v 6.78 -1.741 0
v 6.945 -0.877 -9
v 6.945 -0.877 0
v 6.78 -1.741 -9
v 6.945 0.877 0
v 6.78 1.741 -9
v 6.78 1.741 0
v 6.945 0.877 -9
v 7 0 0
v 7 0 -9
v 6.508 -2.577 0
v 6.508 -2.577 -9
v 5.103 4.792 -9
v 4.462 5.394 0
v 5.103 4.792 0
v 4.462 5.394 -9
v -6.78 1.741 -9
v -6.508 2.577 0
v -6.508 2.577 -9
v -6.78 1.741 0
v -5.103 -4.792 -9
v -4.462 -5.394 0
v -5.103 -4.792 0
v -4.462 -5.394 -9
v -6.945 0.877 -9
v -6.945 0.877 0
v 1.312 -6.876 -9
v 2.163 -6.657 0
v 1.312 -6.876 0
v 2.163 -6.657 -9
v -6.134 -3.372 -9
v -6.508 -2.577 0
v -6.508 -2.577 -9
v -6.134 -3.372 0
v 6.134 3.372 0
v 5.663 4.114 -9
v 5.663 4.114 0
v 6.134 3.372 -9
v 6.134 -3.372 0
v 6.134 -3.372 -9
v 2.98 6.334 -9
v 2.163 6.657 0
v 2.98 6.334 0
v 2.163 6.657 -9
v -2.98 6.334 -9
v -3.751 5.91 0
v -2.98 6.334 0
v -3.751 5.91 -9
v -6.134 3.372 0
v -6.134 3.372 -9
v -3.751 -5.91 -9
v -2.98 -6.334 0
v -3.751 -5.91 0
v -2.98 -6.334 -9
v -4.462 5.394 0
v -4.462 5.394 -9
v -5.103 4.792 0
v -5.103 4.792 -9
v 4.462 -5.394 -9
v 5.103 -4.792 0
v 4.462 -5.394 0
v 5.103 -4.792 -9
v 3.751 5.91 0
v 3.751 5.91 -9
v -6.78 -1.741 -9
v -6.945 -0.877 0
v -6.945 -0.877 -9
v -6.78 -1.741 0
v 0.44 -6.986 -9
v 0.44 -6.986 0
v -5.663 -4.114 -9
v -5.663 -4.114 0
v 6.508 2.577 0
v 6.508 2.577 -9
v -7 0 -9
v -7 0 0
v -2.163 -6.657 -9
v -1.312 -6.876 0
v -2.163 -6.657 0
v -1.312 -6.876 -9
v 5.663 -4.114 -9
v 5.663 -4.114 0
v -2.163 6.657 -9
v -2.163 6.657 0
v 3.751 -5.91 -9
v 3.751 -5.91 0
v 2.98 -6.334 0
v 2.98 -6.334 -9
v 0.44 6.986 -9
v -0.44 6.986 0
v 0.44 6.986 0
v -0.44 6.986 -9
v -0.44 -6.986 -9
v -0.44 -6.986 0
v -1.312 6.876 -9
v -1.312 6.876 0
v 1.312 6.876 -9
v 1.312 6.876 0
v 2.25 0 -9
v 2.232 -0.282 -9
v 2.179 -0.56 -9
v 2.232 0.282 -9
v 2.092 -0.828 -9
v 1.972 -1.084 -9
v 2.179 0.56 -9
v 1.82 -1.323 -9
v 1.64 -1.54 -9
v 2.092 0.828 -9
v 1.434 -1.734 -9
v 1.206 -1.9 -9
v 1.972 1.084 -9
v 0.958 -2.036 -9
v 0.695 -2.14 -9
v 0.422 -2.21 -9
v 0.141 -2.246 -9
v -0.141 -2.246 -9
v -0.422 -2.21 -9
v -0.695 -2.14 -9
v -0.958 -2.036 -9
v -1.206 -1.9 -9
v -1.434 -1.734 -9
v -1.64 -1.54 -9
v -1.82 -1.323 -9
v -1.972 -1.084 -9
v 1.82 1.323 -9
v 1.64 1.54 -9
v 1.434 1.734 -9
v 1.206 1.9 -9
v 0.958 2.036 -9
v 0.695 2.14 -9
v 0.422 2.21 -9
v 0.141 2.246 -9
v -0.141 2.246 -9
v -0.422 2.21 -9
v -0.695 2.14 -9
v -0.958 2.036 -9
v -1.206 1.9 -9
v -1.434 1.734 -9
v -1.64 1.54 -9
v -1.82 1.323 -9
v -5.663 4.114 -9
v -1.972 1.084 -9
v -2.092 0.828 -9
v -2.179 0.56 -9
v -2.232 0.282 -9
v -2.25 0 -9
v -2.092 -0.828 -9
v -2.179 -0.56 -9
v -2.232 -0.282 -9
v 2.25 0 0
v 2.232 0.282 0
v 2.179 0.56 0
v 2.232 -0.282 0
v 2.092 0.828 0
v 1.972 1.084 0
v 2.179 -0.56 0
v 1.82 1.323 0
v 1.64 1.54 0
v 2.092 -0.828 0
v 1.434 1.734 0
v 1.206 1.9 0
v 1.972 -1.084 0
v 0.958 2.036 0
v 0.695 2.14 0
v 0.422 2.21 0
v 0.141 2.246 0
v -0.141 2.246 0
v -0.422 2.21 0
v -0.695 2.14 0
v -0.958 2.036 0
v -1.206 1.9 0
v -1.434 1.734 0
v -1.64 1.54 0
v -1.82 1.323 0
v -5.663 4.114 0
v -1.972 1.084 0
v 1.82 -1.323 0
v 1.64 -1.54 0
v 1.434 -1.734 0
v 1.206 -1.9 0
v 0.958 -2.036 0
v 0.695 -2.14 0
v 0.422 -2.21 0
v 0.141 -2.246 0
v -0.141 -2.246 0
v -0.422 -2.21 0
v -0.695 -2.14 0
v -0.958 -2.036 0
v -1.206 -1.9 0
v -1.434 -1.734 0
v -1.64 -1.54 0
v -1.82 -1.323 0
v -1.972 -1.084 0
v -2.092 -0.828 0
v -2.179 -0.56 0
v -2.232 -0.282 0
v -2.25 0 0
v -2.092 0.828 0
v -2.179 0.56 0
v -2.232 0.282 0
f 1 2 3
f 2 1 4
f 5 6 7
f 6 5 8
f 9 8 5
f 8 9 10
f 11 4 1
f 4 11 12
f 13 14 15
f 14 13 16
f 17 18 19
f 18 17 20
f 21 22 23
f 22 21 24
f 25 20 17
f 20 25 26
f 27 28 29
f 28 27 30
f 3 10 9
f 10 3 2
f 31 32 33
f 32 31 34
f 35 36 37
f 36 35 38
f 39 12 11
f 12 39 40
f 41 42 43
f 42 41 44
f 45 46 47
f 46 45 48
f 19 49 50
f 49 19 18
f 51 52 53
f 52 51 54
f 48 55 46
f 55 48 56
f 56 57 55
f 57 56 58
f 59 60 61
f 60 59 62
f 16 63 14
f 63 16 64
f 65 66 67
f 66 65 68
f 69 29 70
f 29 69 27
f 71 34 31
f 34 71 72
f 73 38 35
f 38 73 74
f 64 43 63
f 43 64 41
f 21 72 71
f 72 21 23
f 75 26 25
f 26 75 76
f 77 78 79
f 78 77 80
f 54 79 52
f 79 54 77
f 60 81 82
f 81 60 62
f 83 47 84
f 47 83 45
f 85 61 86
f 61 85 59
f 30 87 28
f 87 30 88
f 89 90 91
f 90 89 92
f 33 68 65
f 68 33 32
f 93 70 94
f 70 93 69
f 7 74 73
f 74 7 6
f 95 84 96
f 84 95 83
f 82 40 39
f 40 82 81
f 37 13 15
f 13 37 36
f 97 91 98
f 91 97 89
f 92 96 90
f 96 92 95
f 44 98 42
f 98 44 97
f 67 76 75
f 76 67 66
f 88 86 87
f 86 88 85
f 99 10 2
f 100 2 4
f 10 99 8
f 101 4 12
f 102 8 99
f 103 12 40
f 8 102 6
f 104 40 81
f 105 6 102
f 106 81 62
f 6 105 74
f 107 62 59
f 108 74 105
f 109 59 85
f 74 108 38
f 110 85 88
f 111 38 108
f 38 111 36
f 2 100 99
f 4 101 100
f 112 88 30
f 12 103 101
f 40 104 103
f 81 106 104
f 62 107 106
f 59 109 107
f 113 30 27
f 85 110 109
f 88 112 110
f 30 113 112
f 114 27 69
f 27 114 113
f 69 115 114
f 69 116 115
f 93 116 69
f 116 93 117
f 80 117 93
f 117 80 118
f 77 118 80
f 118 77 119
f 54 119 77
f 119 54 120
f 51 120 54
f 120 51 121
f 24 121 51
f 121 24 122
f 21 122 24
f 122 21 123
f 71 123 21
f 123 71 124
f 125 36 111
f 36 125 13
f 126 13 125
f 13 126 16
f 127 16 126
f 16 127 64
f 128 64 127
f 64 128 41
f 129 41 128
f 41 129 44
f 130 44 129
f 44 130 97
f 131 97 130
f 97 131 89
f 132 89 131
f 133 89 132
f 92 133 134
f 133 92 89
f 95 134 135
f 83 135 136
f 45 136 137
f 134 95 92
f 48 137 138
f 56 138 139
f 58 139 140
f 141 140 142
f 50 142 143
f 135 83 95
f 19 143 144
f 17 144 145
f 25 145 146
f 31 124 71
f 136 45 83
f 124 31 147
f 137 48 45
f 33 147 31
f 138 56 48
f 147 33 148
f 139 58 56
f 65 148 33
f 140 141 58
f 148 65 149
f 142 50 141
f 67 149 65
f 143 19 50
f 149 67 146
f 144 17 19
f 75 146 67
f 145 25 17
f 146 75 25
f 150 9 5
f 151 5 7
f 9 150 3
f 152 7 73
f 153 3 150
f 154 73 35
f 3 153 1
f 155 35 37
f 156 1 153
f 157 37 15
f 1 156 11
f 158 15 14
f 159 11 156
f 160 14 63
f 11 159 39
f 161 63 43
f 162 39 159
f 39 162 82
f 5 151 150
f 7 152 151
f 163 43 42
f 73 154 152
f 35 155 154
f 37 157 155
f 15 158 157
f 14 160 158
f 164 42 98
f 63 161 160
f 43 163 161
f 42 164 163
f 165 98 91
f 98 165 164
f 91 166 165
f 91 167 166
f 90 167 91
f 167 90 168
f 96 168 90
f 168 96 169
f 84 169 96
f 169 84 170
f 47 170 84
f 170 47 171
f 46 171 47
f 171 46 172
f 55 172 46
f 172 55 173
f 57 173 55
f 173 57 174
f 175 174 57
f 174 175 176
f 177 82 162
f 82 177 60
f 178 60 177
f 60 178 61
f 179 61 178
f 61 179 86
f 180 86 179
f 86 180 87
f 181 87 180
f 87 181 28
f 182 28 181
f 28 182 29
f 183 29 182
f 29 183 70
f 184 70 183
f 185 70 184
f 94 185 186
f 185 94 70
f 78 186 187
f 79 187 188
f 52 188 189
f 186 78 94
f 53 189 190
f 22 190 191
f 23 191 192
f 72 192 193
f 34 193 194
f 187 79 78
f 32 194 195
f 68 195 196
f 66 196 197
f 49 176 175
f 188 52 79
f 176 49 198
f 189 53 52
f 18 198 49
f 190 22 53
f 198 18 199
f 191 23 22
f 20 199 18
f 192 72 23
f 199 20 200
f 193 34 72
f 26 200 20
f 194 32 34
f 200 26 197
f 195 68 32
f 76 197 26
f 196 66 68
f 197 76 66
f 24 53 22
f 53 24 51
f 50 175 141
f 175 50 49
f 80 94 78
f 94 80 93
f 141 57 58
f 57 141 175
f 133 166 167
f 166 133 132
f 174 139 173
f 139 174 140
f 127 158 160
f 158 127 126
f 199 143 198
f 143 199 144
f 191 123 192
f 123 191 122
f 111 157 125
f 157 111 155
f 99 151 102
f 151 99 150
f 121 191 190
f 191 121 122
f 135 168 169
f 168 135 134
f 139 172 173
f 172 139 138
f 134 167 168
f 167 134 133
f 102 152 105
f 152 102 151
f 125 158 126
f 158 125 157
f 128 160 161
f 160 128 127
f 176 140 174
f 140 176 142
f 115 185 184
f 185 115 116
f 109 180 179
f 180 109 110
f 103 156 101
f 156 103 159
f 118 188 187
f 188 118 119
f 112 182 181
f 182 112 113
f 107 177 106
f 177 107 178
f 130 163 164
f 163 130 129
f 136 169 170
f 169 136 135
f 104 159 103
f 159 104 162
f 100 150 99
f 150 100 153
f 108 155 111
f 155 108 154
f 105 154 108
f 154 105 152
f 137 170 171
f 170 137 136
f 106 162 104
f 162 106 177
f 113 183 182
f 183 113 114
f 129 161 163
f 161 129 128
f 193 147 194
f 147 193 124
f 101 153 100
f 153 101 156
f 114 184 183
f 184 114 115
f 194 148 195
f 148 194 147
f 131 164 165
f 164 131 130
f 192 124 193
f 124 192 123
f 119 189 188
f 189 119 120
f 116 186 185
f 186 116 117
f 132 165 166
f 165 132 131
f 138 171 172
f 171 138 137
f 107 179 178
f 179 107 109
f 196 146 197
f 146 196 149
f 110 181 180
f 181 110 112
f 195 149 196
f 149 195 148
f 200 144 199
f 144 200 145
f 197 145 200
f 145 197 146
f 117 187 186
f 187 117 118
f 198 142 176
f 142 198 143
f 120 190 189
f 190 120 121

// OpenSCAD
$fn = 50;


difference() {
	union() {
		translate(v = [0, 0, -9.0000000000]) {
			cylinder(h = 9, r = 7.0000000000);
		}
		cylinder(h = 0, r = 16.0000000000);
	}
	union() {
		#translate(v = [0, 0, -9]) {
			cylinder(h = 9, r = 2.2500000000);
		}
	}
}
